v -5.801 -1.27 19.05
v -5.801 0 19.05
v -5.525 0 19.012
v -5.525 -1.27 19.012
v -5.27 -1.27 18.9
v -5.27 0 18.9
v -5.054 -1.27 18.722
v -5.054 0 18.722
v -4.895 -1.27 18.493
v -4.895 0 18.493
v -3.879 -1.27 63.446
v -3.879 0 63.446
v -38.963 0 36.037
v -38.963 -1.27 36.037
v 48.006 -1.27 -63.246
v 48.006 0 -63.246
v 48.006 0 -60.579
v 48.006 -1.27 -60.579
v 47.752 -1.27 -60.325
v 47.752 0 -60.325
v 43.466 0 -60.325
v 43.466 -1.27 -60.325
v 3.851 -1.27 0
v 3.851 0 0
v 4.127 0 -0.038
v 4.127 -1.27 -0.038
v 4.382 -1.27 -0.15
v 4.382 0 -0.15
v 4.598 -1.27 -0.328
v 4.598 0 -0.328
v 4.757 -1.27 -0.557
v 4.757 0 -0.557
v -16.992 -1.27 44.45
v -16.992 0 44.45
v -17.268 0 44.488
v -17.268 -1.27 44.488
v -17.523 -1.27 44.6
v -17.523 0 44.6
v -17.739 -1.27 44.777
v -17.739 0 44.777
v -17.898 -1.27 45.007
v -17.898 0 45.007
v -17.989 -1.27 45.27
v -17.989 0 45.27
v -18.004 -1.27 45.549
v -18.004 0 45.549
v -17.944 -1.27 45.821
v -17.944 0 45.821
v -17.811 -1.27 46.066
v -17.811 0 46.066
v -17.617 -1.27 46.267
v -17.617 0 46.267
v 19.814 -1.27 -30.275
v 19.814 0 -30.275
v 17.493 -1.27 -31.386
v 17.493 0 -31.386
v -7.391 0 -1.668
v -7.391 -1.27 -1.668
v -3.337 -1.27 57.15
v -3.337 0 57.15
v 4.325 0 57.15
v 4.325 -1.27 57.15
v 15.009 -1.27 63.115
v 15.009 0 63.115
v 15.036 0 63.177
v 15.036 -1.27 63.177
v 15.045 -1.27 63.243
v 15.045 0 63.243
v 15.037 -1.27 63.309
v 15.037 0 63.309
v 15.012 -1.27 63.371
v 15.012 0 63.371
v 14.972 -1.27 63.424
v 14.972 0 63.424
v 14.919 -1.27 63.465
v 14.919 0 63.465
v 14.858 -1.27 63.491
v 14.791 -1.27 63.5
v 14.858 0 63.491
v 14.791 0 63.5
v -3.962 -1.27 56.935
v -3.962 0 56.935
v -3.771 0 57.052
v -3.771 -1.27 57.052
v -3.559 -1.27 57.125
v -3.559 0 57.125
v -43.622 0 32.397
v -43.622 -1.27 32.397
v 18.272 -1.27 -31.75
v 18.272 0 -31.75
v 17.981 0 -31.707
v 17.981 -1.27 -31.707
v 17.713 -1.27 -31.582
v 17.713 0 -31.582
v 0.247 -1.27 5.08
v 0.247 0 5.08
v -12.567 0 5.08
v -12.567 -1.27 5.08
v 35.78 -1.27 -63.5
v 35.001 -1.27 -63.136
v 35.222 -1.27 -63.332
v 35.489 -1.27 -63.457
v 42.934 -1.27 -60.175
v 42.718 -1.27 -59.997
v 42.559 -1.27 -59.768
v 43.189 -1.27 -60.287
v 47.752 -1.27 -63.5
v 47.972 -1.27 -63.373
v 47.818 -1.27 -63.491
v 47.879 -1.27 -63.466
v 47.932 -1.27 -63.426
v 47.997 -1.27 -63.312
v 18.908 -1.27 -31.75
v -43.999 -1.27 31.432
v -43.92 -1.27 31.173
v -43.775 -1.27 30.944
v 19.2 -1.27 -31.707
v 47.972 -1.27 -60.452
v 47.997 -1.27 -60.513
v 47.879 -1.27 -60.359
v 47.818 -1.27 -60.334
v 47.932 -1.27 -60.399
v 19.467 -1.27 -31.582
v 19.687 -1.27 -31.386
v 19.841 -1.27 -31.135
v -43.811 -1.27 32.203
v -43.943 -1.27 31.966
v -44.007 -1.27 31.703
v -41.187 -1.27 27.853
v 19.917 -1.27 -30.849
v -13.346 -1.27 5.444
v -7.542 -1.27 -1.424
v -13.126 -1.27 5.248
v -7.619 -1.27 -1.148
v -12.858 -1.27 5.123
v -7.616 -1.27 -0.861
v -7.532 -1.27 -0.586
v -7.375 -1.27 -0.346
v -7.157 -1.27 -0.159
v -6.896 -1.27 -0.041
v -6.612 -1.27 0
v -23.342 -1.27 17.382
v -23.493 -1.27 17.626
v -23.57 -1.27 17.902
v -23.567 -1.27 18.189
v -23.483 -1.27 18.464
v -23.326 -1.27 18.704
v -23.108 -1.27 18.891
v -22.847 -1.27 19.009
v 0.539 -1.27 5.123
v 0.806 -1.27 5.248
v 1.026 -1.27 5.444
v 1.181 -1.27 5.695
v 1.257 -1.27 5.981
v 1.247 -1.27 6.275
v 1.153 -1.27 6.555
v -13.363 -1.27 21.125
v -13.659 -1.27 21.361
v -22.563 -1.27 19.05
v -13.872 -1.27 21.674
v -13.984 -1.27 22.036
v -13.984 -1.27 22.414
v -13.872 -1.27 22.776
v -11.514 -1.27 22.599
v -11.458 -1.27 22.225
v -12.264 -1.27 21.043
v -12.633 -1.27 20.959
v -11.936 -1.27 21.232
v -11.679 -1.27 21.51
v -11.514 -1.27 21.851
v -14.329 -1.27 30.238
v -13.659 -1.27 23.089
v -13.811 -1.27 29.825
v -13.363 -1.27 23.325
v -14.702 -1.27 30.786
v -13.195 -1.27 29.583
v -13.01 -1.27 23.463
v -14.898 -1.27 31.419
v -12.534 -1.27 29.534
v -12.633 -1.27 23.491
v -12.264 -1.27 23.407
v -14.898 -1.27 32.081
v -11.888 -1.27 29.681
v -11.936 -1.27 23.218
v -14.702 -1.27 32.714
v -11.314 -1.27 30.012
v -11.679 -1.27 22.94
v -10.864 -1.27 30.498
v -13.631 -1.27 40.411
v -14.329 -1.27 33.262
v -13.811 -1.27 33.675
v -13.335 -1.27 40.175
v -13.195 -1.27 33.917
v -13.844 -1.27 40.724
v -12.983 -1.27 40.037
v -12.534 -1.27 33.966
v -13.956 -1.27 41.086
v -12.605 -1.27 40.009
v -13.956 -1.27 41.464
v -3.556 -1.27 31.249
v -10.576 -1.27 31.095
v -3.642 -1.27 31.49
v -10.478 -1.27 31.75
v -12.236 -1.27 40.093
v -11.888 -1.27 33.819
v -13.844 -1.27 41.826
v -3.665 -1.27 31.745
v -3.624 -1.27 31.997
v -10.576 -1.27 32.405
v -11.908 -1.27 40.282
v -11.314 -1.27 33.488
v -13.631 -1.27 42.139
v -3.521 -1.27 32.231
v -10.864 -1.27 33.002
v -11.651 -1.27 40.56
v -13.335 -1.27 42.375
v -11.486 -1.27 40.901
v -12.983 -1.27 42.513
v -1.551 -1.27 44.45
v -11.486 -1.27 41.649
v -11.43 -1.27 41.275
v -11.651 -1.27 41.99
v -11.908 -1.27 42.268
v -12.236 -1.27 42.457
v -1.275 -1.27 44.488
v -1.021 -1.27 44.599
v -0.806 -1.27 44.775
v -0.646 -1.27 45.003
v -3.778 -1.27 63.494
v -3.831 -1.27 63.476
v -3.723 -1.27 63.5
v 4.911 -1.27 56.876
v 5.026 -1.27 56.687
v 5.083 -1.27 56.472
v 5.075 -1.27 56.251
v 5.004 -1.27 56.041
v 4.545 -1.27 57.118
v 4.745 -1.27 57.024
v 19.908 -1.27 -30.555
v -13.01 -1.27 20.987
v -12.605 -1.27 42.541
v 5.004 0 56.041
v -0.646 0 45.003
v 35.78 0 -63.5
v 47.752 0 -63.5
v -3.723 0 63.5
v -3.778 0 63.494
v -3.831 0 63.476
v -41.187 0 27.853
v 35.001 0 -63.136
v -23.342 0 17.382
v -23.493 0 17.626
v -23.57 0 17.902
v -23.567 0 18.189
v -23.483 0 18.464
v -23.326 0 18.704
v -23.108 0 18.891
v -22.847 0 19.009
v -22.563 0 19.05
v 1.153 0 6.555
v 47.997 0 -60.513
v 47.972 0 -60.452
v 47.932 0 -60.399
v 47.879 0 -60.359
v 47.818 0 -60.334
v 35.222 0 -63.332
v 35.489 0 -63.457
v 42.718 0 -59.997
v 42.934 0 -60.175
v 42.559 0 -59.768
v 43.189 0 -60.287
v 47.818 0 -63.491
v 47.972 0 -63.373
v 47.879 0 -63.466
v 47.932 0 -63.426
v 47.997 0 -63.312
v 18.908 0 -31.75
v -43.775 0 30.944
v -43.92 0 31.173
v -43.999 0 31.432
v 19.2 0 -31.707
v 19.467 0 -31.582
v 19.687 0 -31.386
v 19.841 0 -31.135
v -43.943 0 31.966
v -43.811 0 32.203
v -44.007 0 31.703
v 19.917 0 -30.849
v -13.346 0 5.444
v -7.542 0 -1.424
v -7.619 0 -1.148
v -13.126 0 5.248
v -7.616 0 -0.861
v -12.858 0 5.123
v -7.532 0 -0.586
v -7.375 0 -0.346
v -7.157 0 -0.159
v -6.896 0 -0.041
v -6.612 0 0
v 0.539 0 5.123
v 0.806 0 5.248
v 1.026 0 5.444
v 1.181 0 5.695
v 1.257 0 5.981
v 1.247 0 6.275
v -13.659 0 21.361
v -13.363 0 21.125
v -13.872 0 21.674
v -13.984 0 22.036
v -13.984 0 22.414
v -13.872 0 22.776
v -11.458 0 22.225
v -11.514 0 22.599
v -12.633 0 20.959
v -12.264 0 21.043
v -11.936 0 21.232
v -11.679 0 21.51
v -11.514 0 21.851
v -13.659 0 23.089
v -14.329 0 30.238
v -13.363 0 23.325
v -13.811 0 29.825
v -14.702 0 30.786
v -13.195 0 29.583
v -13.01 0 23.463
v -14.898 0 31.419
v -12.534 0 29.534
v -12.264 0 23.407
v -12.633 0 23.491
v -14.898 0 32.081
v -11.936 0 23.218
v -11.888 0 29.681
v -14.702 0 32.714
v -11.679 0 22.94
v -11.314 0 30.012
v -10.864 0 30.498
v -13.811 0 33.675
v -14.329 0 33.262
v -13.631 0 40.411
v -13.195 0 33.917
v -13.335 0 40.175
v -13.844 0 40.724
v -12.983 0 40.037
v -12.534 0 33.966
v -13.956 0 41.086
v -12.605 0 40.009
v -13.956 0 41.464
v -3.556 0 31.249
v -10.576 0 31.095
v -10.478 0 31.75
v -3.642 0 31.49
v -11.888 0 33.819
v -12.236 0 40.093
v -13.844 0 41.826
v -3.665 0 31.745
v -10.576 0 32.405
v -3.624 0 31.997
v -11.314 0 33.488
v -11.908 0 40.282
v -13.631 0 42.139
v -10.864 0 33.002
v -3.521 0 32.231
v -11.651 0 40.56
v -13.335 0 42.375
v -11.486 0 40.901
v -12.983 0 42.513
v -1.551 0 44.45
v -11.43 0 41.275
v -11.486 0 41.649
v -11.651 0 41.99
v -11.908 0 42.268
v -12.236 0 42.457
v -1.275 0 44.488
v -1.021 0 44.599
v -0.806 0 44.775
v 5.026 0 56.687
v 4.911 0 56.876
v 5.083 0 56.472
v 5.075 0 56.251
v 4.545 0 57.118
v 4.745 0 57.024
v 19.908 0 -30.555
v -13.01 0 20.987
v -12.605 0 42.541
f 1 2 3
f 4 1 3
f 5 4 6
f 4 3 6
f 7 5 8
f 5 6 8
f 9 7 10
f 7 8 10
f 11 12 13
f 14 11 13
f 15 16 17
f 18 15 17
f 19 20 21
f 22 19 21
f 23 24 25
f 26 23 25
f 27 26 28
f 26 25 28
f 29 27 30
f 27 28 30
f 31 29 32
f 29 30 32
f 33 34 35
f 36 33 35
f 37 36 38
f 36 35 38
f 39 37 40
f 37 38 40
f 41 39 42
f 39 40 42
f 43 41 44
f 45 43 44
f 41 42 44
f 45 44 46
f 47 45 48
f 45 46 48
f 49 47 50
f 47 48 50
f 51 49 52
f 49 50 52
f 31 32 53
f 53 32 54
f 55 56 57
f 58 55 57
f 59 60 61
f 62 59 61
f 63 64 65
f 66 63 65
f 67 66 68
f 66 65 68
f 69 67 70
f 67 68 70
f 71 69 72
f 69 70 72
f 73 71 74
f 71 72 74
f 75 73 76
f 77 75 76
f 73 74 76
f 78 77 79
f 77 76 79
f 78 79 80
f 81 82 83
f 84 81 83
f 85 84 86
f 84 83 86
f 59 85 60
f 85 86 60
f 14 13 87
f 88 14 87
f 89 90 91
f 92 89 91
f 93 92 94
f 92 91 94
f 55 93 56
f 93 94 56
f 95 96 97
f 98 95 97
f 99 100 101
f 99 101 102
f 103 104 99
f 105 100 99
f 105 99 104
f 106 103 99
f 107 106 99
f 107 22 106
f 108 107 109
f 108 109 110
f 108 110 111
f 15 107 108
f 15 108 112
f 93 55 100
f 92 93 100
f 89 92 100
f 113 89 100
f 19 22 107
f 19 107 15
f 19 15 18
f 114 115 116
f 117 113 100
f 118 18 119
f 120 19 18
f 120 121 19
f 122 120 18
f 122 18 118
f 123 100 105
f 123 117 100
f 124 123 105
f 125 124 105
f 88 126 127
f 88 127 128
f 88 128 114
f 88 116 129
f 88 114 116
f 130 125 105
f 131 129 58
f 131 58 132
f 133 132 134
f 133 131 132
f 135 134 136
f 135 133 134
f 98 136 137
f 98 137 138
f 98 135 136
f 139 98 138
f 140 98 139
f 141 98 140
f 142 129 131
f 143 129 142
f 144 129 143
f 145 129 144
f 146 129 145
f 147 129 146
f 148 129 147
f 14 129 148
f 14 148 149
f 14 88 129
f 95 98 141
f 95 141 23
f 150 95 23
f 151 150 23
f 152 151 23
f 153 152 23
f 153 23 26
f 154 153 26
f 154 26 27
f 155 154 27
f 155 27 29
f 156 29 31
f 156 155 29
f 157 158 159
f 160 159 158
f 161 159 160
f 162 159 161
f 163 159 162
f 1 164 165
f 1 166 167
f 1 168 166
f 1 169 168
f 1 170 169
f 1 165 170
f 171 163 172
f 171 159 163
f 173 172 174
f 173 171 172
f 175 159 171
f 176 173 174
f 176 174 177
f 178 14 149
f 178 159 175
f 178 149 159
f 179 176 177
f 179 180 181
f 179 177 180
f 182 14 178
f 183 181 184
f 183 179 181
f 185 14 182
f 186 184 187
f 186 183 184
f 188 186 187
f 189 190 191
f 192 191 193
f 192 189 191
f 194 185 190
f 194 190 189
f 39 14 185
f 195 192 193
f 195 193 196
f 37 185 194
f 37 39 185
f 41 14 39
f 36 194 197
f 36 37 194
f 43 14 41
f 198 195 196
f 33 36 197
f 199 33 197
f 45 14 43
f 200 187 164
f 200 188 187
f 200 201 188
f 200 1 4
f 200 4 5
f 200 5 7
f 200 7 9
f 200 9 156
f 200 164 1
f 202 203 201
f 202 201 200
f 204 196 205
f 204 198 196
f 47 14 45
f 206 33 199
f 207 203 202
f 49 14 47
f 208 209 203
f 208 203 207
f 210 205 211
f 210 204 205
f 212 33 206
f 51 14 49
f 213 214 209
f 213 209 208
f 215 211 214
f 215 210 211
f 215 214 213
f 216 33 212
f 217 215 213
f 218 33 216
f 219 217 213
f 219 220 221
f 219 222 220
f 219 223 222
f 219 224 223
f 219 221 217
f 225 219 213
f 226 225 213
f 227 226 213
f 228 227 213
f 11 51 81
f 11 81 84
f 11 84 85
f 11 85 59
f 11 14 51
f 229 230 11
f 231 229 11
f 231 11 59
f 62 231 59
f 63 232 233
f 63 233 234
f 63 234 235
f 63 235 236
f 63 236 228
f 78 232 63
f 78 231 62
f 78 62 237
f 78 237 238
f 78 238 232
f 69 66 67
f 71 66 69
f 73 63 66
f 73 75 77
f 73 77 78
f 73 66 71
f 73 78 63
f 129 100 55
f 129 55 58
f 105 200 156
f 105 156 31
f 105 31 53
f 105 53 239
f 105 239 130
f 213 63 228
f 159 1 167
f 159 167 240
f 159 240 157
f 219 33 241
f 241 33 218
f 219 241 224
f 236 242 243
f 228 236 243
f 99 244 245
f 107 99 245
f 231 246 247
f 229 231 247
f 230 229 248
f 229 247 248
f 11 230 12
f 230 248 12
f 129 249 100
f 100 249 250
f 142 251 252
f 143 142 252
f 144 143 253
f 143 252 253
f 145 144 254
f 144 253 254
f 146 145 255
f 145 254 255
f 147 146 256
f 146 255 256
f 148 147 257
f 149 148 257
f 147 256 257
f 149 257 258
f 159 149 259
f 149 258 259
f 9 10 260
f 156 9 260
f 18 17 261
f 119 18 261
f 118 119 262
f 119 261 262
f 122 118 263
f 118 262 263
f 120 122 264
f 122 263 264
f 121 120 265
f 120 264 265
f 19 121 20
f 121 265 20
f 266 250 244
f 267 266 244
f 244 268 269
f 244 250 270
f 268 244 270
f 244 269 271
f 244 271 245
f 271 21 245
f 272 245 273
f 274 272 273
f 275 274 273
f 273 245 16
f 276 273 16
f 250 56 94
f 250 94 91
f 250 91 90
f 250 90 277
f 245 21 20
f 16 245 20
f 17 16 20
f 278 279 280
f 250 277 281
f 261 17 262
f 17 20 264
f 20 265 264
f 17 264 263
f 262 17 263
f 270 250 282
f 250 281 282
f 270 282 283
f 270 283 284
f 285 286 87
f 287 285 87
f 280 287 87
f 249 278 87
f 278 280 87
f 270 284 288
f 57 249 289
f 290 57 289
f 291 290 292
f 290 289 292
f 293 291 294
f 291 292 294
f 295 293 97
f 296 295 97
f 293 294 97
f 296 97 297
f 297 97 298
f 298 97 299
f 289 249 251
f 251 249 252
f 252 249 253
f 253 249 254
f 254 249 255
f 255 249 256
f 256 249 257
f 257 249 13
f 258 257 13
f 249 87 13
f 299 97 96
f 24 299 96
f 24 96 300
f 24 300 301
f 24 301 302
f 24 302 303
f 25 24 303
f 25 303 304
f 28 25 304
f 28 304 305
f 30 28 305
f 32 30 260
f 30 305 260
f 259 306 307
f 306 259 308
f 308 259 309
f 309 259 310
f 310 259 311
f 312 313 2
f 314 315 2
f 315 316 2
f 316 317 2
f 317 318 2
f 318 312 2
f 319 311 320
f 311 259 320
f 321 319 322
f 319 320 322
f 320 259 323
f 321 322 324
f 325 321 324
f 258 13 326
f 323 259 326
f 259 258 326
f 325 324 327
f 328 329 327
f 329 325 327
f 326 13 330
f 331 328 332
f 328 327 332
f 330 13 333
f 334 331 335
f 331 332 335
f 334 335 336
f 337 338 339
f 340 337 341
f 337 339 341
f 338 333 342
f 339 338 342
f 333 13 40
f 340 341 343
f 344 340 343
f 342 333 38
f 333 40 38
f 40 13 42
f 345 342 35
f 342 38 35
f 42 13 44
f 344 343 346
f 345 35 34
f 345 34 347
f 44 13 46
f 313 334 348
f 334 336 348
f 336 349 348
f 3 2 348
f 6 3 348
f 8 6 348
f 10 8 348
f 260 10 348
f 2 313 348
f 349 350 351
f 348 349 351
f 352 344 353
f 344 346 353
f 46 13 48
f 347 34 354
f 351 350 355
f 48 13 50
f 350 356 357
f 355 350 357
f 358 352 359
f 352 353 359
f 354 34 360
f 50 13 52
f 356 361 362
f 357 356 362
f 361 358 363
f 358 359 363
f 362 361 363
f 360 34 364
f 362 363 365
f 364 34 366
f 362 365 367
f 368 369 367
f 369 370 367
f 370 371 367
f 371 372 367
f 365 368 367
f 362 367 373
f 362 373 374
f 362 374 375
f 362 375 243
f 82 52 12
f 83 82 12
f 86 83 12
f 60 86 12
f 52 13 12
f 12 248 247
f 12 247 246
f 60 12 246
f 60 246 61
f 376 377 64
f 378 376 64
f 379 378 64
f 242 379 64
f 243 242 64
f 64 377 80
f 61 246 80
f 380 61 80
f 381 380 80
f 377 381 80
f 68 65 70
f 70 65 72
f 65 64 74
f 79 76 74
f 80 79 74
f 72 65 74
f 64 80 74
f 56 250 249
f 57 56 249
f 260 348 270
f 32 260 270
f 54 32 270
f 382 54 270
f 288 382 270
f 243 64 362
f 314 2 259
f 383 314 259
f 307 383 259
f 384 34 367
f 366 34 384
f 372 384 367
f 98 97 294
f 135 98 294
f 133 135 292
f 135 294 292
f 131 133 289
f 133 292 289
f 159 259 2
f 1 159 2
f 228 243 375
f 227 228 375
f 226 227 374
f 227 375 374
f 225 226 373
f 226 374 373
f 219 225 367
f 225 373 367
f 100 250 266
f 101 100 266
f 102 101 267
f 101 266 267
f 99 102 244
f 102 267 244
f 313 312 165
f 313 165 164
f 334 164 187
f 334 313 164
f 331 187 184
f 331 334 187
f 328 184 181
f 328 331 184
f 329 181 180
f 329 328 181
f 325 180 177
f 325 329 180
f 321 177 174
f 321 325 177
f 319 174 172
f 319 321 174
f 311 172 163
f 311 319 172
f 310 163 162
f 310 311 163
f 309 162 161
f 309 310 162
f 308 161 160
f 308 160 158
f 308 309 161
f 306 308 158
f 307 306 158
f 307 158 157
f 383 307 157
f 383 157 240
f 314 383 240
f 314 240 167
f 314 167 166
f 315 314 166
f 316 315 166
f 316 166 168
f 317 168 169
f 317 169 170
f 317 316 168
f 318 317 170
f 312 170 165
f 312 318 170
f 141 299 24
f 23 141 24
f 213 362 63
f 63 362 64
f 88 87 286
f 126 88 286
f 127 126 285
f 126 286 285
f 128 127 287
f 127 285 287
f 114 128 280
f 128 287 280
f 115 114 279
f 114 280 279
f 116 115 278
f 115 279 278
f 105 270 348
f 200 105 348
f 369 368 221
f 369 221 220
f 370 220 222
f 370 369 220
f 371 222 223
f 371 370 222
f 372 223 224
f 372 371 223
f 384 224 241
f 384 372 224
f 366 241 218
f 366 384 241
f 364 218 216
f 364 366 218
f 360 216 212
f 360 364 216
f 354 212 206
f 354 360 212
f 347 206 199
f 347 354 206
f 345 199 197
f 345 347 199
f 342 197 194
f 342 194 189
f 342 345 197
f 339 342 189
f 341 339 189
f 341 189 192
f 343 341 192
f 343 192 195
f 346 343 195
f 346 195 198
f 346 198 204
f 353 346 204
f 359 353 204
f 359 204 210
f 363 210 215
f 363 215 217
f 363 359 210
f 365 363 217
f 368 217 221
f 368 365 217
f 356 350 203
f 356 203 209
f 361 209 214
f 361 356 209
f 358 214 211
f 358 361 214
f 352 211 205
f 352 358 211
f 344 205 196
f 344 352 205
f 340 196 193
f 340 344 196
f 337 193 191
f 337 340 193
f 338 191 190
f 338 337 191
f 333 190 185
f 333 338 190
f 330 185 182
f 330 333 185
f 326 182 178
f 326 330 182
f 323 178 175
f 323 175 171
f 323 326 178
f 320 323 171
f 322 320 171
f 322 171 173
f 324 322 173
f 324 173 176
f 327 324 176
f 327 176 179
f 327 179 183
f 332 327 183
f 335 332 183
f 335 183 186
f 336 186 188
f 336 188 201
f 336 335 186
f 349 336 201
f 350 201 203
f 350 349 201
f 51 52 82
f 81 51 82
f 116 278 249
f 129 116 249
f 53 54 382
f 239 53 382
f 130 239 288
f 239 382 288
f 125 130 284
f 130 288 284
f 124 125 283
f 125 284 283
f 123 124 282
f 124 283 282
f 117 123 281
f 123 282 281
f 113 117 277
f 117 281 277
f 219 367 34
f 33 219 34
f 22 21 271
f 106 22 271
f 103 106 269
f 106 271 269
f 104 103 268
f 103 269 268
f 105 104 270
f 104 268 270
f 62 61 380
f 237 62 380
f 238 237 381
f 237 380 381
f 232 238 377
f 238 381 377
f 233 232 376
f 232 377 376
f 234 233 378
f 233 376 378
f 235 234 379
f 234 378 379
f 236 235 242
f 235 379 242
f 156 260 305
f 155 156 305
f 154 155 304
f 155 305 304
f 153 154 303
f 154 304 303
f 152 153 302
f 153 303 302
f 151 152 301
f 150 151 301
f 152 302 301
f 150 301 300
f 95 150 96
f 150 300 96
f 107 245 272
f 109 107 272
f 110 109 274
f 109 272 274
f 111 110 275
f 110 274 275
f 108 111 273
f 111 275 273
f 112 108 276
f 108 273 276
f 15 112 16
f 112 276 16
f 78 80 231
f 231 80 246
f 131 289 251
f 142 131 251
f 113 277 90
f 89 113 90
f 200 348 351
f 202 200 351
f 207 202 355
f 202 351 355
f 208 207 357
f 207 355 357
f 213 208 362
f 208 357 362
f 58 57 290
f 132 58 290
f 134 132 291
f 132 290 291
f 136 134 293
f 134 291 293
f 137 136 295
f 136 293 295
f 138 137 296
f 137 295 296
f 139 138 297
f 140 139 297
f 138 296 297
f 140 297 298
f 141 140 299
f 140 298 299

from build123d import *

# Parameters (mm, degrees)
F0_R     = 1.27
F0_R_2   = 2.2225
F1_DEPTH = 1.27


with BuildPart() as f1:
    # F0 (on Front) → F1 (new body)
    with BuildSketch(Plane.XZ):
        with BuildLine():
            Line((14.791388, 63.5), (-3.722544, 63.5))
            ThreePointArc((-3.722544, 63.5), (-3.805236, 63.486163), (-3.878918, 63.446158))
            Line((-3.878918, 63.446158), (-38.962514, 36.037098))
            Line((-38.962514, 36.037098), (-43.621762, 32.397061))
            ThreePointArc((-43.621762, 32.397061), (-44.006646, 31.703164), (-43.775246, 30.944163))
            Line((-43.775246, 30.944163), (-41.186804, 27.852871))
            Line((-41.186804, 27.852871), (35.001432, -63.136264))
            ThreePointArc((35.001432, -63.136264), (35.350553, -63.404586), (35.78041, -63.5))
            Line((35.78041, -63.5), (44.45, -63.5))
            Line((44.45, -63.5), (47.752, -63.5))
            ThreePointArc((47.752, -63.5), (47.931605, -63.425605), (48.006, -63.246))
            Line((48.006, -63.246), (48.006, -60.579))
            ThreePointArc((48.006, -60.579), (47.931605, -60.399395), (47.752, -60.325))
            Line((47.752, -60.325), (43.465528, -60.325))
            ThreePointArc((43.465528, -60.325), (42.933685, -60.174679), (42.559219, -59.768196))
            Line((42.559219, -59.768196), (-3.556335, 31.249344))
            ThreePointArc((-3.556335, 31.249344), (-3.665378, 31.744831), (-3.521239, 32.231268))
            Line((-3.521239, 32.231268), (15.009191, 63.115318))
            ThreePointArc((15.009191, 63.115318), (15.012418, 63.371145), (14.791388, 63.5))
        make_face()
        with BuildLine():
            Line((18.907663, -31.75), (18.272293, -31.75))
            ThreePointArc((18.272293, -31.75), (17.842435, -31.654586), (17.493315, -31.386264))
            Line((17.493315, -31.386264), (-7.390557, -1.668264))
            ThreePointArc((-7.390557, -1.668264), (-7.532165, -0.586142), (-6.611579, 0))
            Line((-6.611579, 0), (3.850543, 0))
            ThreePointArc((3.850543, 0), (4.382385, -0.150321), (4.756851, -0.556804))
            Line((4.756851, -0.556804), (19.813971, -30.274804))
            ThreePointArc((19.813971, -30.274804), (19.773342, -31.265842), (18.907663, -31.75))
        make_face(mode=Mode.SUBTRACT)
        with BuildLine():
            ThreePointArc((-5.801457, 19.05), (-5.269615, 18.899679), (-4.895149, 18.493196))
            Line((-4.895149, 18.493196), (1.153438, 6.555196))
            ThreePointArc((1.153438, 6.555196), (1.112808, 5.564158), (0.24713, 5.08))
            Line((0.24713, 5.08), (-12.566694, 5.08))
            ThreePointArc((-12.566694, 5.08), (-12.996552, 5.175414), (-13.345672, 5.443736))
            Line((-13.345672, 5.443736), (-23.341757, 17.381736))
            ThreePointArc((-23.341757, 17.381736), (-23.483365, 18.463858), (-22.562779, 19.05))
            Line((-22.562779, 19.05), (-5.801457, 19.05))
        make_face(mode=Mode.SUBTRACT)
        with Locations((-12.727872, 22.225)):
            Circle(F0_R, mode=Mode.SUBTRACT)
        with Locations((-12.7, 31.75)):
            Circle(F0_R_2, mode=Mode.SUBTRACT)
        with Locations((-12.7, 41.275)):
            Circle(F0_R, mode=Mode.SUBTRACT)
        with BuildLine():
            ThreePointArc((-3.962149, 56.934633), (-3.667421, 57.094651), (-3.336654, 57.15))
            Line((-3.336654, 57.15), (4.325205, 57.15))
            ThreePointArc((4.325205, 57.15), (4.975285, 56.785541), (5.003509, 56.040801))
            Line((5.003509, 56.040801), (-0.646303, 45.003068))
            ThreePointArc((-0.646303, 45.003068), (-1.020653, 44.599226), (-1.550708, 44.45))
            Line((-1.550708, 44.45), (-16.991694, 44.45))
            ThreePointArc((-16.991694, 44.45), (-17.952345, 45.135233), (-17.617189, 46.266633))
            Line((-17.617189, 46.266633), (-3.962149, 56.934633))
        make_face(mode=Mode.SUBTRACT)
    extrude(amount=F1_DEPTH)


solid = f1.part
